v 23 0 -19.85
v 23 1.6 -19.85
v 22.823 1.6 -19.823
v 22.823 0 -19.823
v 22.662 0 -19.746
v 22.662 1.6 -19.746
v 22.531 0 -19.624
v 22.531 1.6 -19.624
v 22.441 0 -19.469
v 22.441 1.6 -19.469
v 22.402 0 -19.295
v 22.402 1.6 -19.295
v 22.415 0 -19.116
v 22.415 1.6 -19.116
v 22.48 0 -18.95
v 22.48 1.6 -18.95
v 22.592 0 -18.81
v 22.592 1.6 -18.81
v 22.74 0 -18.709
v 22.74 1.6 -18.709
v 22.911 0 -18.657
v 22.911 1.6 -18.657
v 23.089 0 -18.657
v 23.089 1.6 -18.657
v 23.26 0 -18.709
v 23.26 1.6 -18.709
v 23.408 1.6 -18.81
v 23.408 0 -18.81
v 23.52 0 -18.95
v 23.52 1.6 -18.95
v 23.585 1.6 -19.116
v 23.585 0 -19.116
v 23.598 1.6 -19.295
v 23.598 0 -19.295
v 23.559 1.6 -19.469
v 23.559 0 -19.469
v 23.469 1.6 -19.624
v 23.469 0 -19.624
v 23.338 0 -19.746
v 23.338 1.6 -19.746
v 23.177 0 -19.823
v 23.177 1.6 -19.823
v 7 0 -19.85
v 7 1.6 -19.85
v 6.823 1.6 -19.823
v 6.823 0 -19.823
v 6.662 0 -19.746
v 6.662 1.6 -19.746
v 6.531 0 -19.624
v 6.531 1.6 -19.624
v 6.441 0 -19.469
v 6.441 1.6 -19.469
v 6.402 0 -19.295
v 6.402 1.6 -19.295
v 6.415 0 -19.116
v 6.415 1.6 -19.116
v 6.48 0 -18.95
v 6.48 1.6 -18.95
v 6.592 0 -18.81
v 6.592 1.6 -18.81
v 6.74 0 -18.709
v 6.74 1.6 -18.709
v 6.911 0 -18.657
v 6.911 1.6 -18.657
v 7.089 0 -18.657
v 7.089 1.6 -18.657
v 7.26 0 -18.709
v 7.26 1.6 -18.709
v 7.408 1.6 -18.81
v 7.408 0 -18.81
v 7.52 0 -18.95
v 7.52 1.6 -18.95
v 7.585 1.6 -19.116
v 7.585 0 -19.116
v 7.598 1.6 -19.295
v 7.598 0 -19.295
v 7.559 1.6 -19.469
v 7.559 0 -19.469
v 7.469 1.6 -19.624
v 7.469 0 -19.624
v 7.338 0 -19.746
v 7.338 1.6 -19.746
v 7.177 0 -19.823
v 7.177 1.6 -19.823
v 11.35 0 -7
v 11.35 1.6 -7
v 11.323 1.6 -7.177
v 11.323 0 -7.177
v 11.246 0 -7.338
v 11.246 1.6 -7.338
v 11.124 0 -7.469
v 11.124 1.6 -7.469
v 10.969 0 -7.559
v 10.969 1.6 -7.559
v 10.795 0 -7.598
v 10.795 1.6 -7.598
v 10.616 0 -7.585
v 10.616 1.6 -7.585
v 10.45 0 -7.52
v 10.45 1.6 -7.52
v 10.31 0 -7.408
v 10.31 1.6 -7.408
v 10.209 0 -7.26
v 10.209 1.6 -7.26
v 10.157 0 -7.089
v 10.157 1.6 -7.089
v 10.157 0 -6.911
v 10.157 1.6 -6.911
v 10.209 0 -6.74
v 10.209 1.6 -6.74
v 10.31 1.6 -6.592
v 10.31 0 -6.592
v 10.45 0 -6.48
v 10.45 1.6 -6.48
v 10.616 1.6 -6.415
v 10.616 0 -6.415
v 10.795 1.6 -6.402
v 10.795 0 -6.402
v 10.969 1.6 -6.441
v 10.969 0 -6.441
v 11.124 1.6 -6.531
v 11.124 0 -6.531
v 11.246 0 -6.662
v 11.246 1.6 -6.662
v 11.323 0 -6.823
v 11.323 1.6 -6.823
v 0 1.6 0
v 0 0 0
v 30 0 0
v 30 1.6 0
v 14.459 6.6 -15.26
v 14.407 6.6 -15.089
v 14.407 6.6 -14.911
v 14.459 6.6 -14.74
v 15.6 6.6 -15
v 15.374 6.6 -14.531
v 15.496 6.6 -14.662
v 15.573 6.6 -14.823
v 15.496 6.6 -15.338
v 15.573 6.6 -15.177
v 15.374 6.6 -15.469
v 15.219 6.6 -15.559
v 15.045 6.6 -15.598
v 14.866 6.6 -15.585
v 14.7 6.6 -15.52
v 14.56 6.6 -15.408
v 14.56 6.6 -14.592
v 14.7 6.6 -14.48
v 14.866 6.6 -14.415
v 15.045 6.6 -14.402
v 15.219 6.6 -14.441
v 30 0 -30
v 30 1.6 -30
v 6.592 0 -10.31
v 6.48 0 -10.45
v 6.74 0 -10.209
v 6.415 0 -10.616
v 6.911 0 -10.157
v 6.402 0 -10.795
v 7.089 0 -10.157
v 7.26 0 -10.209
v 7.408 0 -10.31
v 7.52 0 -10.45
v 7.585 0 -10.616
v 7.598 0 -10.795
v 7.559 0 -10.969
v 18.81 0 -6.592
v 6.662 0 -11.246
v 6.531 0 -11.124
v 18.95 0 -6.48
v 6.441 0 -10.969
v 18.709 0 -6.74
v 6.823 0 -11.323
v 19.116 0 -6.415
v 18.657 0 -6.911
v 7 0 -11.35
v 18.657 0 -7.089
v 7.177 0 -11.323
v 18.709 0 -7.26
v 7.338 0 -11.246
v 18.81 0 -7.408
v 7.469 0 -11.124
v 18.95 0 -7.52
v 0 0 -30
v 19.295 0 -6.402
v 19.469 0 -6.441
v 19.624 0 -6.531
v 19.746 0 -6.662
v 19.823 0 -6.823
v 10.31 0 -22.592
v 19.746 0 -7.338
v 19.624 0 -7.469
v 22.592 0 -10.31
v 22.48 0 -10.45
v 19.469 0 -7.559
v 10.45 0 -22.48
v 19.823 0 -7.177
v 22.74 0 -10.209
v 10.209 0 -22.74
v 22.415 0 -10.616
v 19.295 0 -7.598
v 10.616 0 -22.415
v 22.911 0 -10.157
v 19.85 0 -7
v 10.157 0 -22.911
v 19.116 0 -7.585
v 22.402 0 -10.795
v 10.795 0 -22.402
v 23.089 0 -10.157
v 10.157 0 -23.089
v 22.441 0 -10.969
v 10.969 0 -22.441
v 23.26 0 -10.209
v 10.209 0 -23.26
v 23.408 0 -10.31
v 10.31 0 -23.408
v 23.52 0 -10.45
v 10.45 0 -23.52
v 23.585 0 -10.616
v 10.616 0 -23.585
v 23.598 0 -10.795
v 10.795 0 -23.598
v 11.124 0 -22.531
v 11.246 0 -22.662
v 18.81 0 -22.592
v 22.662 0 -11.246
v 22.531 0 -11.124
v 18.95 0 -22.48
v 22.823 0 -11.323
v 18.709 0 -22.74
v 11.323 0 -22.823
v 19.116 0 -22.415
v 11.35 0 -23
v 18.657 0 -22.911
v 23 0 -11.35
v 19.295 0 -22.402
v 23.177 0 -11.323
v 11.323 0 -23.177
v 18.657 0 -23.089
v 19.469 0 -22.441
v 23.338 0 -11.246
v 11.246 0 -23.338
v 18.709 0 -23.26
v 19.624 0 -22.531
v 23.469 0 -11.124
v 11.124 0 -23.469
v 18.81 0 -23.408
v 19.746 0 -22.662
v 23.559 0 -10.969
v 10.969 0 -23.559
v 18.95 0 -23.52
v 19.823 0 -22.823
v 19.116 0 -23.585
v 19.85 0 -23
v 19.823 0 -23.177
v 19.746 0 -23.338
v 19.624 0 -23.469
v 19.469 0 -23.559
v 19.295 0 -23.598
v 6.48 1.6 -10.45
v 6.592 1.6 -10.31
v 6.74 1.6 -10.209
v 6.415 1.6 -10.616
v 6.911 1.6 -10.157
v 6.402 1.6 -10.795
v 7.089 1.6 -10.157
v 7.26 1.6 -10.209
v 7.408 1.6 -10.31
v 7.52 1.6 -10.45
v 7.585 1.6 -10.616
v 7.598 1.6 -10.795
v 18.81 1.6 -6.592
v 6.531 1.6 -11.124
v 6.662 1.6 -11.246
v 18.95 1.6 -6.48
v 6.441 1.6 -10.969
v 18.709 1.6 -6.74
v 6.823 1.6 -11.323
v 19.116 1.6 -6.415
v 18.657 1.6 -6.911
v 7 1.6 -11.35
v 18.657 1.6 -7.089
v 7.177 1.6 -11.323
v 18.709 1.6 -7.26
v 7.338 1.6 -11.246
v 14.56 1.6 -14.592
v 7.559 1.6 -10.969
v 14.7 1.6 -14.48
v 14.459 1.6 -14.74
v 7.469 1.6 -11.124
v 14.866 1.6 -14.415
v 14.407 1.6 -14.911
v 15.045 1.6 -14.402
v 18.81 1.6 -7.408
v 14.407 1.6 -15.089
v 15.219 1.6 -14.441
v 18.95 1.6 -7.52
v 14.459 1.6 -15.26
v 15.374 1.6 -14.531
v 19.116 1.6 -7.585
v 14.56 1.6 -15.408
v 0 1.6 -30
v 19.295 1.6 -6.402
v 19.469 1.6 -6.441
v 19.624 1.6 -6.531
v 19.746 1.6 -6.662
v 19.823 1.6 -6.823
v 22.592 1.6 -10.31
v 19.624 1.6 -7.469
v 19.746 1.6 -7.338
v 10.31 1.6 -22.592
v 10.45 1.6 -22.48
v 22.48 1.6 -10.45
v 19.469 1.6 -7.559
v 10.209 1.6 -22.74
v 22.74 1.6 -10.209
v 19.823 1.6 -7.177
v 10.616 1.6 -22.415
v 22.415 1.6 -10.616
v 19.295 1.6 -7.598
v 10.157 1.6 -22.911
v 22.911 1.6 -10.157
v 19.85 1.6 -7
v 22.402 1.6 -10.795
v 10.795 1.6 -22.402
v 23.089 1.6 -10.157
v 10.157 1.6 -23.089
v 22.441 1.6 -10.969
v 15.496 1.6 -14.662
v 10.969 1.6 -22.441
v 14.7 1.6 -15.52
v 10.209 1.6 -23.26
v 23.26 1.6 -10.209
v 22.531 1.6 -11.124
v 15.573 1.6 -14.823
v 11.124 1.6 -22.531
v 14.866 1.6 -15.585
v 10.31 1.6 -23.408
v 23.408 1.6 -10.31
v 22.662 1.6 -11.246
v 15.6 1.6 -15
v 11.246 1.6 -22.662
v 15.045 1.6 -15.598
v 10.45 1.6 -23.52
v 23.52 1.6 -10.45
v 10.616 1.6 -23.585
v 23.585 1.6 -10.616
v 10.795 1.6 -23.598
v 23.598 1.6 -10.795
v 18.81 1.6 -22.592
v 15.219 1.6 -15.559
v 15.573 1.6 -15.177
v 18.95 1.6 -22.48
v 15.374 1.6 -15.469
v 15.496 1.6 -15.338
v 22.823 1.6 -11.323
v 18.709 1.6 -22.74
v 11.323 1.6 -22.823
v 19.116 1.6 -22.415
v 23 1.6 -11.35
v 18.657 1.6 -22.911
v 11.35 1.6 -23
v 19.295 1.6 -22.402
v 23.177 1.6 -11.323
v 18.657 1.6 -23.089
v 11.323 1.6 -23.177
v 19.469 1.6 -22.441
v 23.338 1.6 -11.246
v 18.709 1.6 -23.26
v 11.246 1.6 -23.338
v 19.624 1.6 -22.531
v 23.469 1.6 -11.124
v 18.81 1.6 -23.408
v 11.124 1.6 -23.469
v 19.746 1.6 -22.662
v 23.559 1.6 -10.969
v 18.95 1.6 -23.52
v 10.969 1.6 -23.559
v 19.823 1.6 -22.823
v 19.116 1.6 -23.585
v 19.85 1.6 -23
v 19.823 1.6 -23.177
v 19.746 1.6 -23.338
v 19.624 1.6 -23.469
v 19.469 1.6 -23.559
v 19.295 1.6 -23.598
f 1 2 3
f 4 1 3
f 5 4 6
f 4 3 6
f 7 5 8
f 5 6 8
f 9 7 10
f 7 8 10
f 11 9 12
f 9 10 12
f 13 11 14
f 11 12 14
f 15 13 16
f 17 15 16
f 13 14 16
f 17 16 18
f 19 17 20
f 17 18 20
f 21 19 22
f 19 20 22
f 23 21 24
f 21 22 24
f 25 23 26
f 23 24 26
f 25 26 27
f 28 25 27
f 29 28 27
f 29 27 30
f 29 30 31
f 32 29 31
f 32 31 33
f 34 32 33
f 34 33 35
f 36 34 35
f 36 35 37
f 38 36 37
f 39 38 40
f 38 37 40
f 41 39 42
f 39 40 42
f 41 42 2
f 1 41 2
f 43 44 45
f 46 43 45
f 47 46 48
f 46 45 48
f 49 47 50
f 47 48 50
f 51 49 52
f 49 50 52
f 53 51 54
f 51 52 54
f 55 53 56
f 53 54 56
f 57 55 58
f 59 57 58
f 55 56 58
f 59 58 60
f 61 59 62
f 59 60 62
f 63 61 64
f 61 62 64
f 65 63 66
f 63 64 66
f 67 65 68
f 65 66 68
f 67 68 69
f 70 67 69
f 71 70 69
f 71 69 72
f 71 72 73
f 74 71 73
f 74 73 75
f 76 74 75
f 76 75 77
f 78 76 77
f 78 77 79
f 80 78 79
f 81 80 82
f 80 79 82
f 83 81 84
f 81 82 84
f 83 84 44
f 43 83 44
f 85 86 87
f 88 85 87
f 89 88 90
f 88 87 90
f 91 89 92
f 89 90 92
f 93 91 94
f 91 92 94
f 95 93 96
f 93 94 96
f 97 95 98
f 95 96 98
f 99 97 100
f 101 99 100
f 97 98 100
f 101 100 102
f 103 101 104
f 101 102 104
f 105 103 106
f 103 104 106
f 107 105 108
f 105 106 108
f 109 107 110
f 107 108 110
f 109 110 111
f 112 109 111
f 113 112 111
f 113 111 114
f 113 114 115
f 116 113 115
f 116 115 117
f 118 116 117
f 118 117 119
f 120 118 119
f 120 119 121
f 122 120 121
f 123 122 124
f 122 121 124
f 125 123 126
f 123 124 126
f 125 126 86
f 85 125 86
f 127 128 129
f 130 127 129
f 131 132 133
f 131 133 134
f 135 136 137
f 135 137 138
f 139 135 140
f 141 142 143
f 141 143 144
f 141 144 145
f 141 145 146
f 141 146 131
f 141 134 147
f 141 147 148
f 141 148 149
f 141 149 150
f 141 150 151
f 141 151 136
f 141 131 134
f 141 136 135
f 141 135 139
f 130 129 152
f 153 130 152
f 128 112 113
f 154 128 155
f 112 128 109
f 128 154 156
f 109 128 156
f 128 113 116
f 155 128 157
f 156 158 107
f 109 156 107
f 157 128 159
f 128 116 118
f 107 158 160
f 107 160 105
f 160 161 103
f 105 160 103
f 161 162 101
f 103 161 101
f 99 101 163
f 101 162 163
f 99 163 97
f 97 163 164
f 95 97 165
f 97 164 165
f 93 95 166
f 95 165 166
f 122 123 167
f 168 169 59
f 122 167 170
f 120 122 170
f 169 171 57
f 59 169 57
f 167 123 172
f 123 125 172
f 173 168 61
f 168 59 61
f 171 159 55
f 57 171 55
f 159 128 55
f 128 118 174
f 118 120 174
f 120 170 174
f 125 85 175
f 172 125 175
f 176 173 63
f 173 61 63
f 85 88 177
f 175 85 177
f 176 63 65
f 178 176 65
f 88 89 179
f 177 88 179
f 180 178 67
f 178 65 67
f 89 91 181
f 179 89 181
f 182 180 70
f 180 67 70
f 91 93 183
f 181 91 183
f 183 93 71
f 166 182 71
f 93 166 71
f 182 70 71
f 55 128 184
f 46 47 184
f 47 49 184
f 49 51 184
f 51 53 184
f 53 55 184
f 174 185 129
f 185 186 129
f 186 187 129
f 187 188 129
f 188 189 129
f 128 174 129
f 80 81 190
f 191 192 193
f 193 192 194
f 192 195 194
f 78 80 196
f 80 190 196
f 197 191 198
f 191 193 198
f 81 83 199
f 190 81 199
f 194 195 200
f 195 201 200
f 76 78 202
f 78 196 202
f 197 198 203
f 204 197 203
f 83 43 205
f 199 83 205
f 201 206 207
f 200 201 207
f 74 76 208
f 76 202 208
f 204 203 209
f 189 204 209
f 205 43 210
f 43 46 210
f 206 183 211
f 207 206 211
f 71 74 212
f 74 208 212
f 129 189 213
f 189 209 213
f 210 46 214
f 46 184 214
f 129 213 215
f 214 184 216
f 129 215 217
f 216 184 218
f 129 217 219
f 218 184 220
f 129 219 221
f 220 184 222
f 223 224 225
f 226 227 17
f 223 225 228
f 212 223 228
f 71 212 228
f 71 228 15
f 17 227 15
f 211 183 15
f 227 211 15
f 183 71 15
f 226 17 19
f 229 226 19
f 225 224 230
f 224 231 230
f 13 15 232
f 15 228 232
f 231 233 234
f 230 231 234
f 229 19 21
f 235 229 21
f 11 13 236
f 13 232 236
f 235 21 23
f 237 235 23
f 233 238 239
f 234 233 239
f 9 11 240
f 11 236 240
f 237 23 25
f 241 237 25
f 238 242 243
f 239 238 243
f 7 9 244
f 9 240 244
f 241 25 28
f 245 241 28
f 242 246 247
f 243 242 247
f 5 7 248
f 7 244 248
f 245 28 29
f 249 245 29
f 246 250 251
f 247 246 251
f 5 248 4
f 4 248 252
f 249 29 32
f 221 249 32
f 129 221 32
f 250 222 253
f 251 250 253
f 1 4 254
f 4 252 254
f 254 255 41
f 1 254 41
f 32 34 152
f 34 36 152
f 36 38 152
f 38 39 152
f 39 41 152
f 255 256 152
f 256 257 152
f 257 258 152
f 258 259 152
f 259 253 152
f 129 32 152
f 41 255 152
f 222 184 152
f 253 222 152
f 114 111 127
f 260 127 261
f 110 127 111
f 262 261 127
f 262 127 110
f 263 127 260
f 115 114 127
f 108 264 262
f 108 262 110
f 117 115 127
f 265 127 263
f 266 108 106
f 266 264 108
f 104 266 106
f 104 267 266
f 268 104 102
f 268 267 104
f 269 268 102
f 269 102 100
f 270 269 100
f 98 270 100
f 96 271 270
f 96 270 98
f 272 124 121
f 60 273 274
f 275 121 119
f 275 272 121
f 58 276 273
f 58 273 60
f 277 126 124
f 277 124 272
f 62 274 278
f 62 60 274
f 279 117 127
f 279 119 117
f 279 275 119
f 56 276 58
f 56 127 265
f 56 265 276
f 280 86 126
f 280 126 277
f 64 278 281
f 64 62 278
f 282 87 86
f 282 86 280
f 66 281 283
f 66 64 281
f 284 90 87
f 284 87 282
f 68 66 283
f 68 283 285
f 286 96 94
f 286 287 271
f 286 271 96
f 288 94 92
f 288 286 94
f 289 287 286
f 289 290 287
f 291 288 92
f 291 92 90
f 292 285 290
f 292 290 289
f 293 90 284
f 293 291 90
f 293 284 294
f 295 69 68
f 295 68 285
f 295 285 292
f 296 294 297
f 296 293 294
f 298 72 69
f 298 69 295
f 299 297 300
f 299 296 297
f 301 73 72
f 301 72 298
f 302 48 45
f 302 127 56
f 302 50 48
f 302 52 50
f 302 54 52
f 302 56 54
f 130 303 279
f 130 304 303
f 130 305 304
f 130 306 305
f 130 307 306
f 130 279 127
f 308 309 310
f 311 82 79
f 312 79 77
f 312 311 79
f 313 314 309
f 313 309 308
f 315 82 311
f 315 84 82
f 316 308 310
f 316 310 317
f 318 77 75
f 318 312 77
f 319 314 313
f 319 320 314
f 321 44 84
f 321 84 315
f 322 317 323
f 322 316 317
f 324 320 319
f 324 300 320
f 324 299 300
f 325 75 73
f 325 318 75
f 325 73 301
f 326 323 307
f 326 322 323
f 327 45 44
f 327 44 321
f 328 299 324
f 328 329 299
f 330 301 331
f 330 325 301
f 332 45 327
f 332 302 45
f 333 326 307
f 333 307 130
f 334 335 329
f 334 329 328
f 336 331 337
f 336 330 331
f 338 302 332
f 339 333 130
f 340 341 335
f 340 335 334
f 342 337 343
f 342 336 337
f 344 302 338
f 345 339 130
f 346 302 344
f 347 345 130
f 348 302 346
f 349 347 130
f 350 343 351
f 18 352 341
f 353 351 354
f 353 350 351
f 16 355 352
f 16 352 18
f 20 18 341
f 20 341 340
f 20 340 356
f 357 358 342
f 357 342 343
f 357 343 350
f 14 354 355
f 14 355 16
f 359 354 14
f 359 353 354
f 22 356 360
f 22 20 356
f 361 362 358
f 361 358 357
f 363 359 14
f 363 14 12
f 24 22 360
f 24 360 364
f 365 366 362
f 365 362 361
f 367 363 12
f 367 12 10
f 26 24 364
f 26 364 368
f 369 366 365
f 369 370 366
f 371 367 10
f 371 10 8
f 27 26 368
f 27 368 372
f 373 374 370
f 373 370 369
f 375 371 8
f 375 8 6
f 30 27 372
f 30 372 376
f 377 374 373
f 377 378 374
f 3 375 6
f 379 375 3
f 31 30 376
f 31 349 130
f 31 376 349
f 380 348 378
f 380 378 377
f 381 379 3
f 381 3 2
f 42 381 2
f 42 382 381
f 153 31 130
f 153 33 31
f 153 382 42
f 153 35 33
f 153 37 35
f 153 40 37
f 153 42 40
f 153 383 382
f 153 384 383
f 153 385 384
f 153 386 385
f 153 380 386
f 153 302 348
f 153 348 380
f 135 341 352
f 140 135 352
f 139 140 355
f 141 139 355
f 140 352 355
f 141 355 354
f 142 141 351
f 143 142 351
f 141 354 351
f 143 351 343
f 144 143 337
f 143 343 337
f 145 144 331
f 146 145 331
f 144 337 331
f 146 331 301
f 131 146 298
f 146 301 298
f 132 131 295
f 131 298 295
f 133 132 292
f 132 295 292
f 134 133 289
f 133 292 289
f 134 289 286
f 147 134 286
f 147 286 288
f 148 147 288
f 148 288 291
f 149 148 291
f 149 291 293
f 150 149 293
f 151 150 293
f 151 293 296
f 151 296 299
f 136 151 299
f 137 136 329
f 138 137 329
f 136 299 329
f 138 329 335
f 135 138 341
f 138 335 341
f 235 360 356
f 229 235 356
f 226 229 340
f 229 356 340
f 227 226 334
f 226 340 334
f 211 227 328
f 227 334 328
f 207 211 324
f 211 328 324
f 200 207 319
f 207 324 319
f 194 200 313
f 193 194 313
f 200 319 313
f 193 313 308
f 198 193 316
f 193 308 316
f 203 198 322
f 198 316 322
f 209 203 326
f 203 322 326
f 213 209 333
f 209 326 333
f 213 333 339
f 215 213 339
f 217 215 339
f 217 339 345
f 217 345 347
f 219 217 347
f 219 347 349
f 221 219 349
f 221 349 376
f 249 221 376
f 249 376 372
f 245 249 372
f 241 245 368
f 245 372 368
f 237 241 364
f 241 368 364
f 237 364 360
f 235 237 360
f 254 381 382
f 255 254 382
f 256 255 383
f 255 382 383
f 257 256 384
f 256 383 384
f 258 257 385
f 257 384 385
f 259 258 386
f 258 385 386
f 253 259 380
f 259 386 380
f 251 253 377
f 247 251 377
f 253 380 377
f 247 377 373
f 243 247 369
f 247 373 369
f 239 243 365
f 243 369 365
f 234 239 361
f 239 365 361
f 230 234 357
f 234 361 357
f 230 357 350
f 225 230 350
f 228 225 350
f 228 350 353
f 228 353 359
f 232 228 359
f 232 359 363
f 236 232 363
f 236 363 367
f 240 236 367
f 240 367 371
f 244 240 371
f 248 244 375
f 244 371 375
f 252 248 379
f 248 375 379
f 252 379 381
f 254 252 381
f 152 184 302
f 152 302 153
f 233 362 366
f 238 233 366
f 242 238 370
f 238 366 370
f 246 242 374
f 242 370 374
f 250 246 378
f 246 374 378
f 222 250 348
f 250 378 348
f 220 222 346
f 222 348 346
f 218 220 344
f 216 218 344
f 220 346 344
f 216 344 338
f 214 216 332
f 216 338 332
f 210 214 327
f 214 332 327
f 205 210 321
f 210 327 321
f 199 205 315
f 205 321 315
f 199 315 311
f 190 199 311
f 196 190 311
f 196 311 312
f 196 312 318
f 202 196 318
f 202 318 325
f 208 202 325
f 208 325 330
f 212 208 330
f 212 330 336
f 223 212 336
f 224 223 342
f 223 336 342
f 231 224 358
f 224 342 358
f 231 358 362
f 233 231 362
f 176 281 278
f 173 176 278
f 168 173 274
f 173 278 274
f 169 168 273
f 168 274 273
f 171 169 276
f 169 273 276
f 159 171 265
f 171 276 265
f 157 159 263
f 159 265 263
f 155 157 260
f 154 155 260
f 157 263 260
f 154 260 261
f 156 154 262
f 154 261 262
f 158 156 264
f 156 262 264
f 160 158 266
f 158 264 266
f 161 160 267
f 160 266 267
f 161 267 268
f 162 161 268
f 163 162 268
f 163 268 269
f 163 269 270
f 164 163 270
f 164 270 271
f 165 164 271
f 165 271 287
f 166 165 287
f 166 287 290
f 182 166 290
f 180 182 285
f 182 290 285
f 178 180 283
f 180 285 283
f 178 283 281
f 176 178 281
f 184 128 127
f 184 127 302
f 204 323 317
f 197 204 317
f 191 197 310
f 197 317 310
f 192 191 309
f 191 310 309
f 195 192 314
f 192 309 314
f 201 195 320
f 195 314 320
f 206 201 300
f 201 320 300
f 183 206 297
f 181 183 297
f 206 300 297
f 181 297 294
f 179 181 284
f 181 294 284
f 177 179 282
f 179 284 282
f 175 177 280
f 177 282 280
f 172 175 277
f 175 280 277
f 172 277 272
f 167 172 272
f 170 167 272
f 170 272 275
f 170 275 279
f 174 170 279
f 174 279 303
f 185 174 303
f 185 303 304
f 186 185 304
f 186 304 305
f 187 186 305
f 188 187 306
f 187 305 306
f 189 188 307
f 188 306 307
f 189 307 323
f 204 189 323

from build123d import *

# Parameters (mm, degrees)
SKETCH1_W           = 30
SKETCH1_H           = 30
BOSS_EXTRUDE1_DEPTH = 1.6
SKETCH2_R           = 0.6
CUT_EXTRUDE1_DEPTH  = 1.6
CIRPATTERN1_COUNT   = 2
CIRPATTERN1_ANGLE   = 90
SKETCH4_R           = 0.6
BOSS_EXTRUDE2_DEPTH = 5


with BuildPart() as part:
    # Sketch1 → Boss-Extrude1 (new body)
    with BuildSketch(Plane(origin=(0, 0, 0), x_dir=(1, 0, 0), z_dir=(0, 1, 0))):
        with Locations((15, 15)):
            Rectangle(SKETCH1_W, SKETCH1_H)
    extrude(amount=BOSS_EXTRUDE1_DEPTH)

    # Sketch2 → Cut-Extrude1 (cut)
    with BuildSketch(Plane(origin=(0, 1.6, 0), x_dir=(1, 0, 0), z_dir=(0, 1, 0))):
        with Locations((19.25, 7)):
            Circle(SKETCH2_R)
        with Locations((10.75, 7)):
            Circle(SKETCH2_R)
        with Locations((19.25, 23)):
            Circle(SKETCH2_R)
        with Locations((10.75, 23)):
            Circle(SKETCH2_R)
    cut_extrude1 = extrude(amount=-CUT_EXTRUDE1_DEPTH, mode=Mode.SUBTRACT)

    # CirPattern1: Cut-Extrude1 ×2 about axis
    cirpattern1_axis = Axis((15, 0, -15), (0, 1, 0))
    for i in range(1, CIRPATTERN1_COUNT):
        add(cut_extrude1.rotate(cirpattern1_axis, i * CIRPATTERN1_ANGLE / (CIRPATTERN1_COUNT - 1)), mode=Mode.SUBTRACT)

    # Sketch4 → Boss-Extrude2 (add)
    with BuildSketch(Plane(origin=(0, 1.6, 0), x_dir=(1, 0, 0), z_dir=(0, 1, 0))):
        with Locations((15, 15)):
            Circle(SKETCH4_R)
    extrude(amount=BOSS_EXTRUDE2_DEPTH)


solid = part.part
